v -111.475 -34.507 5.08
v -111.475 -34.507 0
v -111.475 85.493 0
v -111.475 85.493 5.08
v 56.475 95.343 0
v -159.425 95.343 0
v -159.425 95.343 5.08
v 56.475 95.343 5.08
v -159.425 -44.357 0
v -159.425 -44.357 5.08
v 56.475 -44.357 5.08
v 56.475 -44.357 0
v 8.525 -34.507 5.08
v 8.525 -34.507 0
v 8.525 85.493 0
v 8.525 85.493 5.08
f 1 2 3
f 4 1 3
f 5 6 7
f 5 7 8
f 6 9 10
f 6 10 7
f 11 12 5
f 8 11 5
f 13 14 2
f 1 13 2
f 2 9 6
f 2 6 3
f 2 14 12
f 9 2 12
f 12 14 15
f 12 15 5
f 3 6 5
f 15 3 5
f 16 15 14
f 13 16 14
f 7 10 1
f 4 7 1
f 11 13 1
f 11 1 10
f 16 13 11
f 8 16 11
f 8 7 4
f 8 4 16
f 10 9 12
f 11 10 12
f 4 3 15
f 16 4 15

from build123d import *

# Parameters (mm, degrees)
F0_W     = 215.9
F0_H     = 139.7
F1_DEPTH = 5.08


with BuildPart() as f1:
    # F0 (on Top) → F1 (new body)
    with BuildSketch(Plane.XY):
        with Locations((-51.475366, 25.492683)):
            Rectangle(F0_W, F0_H)
        Polygon((-111.475366, -34.507317), (-111.475366, 25.492683), (-111.475366, 85.492683), (-51.475366, 85.492683), (8.524634, 85.492683), (8.524634, 25.492683), (8.524634, -34.507317), (-51.475366, -34.507317), align=None, mode=Mode.SUBTRACT)
    extrude(amount=F1_DEPTH)


solid = f1.part
